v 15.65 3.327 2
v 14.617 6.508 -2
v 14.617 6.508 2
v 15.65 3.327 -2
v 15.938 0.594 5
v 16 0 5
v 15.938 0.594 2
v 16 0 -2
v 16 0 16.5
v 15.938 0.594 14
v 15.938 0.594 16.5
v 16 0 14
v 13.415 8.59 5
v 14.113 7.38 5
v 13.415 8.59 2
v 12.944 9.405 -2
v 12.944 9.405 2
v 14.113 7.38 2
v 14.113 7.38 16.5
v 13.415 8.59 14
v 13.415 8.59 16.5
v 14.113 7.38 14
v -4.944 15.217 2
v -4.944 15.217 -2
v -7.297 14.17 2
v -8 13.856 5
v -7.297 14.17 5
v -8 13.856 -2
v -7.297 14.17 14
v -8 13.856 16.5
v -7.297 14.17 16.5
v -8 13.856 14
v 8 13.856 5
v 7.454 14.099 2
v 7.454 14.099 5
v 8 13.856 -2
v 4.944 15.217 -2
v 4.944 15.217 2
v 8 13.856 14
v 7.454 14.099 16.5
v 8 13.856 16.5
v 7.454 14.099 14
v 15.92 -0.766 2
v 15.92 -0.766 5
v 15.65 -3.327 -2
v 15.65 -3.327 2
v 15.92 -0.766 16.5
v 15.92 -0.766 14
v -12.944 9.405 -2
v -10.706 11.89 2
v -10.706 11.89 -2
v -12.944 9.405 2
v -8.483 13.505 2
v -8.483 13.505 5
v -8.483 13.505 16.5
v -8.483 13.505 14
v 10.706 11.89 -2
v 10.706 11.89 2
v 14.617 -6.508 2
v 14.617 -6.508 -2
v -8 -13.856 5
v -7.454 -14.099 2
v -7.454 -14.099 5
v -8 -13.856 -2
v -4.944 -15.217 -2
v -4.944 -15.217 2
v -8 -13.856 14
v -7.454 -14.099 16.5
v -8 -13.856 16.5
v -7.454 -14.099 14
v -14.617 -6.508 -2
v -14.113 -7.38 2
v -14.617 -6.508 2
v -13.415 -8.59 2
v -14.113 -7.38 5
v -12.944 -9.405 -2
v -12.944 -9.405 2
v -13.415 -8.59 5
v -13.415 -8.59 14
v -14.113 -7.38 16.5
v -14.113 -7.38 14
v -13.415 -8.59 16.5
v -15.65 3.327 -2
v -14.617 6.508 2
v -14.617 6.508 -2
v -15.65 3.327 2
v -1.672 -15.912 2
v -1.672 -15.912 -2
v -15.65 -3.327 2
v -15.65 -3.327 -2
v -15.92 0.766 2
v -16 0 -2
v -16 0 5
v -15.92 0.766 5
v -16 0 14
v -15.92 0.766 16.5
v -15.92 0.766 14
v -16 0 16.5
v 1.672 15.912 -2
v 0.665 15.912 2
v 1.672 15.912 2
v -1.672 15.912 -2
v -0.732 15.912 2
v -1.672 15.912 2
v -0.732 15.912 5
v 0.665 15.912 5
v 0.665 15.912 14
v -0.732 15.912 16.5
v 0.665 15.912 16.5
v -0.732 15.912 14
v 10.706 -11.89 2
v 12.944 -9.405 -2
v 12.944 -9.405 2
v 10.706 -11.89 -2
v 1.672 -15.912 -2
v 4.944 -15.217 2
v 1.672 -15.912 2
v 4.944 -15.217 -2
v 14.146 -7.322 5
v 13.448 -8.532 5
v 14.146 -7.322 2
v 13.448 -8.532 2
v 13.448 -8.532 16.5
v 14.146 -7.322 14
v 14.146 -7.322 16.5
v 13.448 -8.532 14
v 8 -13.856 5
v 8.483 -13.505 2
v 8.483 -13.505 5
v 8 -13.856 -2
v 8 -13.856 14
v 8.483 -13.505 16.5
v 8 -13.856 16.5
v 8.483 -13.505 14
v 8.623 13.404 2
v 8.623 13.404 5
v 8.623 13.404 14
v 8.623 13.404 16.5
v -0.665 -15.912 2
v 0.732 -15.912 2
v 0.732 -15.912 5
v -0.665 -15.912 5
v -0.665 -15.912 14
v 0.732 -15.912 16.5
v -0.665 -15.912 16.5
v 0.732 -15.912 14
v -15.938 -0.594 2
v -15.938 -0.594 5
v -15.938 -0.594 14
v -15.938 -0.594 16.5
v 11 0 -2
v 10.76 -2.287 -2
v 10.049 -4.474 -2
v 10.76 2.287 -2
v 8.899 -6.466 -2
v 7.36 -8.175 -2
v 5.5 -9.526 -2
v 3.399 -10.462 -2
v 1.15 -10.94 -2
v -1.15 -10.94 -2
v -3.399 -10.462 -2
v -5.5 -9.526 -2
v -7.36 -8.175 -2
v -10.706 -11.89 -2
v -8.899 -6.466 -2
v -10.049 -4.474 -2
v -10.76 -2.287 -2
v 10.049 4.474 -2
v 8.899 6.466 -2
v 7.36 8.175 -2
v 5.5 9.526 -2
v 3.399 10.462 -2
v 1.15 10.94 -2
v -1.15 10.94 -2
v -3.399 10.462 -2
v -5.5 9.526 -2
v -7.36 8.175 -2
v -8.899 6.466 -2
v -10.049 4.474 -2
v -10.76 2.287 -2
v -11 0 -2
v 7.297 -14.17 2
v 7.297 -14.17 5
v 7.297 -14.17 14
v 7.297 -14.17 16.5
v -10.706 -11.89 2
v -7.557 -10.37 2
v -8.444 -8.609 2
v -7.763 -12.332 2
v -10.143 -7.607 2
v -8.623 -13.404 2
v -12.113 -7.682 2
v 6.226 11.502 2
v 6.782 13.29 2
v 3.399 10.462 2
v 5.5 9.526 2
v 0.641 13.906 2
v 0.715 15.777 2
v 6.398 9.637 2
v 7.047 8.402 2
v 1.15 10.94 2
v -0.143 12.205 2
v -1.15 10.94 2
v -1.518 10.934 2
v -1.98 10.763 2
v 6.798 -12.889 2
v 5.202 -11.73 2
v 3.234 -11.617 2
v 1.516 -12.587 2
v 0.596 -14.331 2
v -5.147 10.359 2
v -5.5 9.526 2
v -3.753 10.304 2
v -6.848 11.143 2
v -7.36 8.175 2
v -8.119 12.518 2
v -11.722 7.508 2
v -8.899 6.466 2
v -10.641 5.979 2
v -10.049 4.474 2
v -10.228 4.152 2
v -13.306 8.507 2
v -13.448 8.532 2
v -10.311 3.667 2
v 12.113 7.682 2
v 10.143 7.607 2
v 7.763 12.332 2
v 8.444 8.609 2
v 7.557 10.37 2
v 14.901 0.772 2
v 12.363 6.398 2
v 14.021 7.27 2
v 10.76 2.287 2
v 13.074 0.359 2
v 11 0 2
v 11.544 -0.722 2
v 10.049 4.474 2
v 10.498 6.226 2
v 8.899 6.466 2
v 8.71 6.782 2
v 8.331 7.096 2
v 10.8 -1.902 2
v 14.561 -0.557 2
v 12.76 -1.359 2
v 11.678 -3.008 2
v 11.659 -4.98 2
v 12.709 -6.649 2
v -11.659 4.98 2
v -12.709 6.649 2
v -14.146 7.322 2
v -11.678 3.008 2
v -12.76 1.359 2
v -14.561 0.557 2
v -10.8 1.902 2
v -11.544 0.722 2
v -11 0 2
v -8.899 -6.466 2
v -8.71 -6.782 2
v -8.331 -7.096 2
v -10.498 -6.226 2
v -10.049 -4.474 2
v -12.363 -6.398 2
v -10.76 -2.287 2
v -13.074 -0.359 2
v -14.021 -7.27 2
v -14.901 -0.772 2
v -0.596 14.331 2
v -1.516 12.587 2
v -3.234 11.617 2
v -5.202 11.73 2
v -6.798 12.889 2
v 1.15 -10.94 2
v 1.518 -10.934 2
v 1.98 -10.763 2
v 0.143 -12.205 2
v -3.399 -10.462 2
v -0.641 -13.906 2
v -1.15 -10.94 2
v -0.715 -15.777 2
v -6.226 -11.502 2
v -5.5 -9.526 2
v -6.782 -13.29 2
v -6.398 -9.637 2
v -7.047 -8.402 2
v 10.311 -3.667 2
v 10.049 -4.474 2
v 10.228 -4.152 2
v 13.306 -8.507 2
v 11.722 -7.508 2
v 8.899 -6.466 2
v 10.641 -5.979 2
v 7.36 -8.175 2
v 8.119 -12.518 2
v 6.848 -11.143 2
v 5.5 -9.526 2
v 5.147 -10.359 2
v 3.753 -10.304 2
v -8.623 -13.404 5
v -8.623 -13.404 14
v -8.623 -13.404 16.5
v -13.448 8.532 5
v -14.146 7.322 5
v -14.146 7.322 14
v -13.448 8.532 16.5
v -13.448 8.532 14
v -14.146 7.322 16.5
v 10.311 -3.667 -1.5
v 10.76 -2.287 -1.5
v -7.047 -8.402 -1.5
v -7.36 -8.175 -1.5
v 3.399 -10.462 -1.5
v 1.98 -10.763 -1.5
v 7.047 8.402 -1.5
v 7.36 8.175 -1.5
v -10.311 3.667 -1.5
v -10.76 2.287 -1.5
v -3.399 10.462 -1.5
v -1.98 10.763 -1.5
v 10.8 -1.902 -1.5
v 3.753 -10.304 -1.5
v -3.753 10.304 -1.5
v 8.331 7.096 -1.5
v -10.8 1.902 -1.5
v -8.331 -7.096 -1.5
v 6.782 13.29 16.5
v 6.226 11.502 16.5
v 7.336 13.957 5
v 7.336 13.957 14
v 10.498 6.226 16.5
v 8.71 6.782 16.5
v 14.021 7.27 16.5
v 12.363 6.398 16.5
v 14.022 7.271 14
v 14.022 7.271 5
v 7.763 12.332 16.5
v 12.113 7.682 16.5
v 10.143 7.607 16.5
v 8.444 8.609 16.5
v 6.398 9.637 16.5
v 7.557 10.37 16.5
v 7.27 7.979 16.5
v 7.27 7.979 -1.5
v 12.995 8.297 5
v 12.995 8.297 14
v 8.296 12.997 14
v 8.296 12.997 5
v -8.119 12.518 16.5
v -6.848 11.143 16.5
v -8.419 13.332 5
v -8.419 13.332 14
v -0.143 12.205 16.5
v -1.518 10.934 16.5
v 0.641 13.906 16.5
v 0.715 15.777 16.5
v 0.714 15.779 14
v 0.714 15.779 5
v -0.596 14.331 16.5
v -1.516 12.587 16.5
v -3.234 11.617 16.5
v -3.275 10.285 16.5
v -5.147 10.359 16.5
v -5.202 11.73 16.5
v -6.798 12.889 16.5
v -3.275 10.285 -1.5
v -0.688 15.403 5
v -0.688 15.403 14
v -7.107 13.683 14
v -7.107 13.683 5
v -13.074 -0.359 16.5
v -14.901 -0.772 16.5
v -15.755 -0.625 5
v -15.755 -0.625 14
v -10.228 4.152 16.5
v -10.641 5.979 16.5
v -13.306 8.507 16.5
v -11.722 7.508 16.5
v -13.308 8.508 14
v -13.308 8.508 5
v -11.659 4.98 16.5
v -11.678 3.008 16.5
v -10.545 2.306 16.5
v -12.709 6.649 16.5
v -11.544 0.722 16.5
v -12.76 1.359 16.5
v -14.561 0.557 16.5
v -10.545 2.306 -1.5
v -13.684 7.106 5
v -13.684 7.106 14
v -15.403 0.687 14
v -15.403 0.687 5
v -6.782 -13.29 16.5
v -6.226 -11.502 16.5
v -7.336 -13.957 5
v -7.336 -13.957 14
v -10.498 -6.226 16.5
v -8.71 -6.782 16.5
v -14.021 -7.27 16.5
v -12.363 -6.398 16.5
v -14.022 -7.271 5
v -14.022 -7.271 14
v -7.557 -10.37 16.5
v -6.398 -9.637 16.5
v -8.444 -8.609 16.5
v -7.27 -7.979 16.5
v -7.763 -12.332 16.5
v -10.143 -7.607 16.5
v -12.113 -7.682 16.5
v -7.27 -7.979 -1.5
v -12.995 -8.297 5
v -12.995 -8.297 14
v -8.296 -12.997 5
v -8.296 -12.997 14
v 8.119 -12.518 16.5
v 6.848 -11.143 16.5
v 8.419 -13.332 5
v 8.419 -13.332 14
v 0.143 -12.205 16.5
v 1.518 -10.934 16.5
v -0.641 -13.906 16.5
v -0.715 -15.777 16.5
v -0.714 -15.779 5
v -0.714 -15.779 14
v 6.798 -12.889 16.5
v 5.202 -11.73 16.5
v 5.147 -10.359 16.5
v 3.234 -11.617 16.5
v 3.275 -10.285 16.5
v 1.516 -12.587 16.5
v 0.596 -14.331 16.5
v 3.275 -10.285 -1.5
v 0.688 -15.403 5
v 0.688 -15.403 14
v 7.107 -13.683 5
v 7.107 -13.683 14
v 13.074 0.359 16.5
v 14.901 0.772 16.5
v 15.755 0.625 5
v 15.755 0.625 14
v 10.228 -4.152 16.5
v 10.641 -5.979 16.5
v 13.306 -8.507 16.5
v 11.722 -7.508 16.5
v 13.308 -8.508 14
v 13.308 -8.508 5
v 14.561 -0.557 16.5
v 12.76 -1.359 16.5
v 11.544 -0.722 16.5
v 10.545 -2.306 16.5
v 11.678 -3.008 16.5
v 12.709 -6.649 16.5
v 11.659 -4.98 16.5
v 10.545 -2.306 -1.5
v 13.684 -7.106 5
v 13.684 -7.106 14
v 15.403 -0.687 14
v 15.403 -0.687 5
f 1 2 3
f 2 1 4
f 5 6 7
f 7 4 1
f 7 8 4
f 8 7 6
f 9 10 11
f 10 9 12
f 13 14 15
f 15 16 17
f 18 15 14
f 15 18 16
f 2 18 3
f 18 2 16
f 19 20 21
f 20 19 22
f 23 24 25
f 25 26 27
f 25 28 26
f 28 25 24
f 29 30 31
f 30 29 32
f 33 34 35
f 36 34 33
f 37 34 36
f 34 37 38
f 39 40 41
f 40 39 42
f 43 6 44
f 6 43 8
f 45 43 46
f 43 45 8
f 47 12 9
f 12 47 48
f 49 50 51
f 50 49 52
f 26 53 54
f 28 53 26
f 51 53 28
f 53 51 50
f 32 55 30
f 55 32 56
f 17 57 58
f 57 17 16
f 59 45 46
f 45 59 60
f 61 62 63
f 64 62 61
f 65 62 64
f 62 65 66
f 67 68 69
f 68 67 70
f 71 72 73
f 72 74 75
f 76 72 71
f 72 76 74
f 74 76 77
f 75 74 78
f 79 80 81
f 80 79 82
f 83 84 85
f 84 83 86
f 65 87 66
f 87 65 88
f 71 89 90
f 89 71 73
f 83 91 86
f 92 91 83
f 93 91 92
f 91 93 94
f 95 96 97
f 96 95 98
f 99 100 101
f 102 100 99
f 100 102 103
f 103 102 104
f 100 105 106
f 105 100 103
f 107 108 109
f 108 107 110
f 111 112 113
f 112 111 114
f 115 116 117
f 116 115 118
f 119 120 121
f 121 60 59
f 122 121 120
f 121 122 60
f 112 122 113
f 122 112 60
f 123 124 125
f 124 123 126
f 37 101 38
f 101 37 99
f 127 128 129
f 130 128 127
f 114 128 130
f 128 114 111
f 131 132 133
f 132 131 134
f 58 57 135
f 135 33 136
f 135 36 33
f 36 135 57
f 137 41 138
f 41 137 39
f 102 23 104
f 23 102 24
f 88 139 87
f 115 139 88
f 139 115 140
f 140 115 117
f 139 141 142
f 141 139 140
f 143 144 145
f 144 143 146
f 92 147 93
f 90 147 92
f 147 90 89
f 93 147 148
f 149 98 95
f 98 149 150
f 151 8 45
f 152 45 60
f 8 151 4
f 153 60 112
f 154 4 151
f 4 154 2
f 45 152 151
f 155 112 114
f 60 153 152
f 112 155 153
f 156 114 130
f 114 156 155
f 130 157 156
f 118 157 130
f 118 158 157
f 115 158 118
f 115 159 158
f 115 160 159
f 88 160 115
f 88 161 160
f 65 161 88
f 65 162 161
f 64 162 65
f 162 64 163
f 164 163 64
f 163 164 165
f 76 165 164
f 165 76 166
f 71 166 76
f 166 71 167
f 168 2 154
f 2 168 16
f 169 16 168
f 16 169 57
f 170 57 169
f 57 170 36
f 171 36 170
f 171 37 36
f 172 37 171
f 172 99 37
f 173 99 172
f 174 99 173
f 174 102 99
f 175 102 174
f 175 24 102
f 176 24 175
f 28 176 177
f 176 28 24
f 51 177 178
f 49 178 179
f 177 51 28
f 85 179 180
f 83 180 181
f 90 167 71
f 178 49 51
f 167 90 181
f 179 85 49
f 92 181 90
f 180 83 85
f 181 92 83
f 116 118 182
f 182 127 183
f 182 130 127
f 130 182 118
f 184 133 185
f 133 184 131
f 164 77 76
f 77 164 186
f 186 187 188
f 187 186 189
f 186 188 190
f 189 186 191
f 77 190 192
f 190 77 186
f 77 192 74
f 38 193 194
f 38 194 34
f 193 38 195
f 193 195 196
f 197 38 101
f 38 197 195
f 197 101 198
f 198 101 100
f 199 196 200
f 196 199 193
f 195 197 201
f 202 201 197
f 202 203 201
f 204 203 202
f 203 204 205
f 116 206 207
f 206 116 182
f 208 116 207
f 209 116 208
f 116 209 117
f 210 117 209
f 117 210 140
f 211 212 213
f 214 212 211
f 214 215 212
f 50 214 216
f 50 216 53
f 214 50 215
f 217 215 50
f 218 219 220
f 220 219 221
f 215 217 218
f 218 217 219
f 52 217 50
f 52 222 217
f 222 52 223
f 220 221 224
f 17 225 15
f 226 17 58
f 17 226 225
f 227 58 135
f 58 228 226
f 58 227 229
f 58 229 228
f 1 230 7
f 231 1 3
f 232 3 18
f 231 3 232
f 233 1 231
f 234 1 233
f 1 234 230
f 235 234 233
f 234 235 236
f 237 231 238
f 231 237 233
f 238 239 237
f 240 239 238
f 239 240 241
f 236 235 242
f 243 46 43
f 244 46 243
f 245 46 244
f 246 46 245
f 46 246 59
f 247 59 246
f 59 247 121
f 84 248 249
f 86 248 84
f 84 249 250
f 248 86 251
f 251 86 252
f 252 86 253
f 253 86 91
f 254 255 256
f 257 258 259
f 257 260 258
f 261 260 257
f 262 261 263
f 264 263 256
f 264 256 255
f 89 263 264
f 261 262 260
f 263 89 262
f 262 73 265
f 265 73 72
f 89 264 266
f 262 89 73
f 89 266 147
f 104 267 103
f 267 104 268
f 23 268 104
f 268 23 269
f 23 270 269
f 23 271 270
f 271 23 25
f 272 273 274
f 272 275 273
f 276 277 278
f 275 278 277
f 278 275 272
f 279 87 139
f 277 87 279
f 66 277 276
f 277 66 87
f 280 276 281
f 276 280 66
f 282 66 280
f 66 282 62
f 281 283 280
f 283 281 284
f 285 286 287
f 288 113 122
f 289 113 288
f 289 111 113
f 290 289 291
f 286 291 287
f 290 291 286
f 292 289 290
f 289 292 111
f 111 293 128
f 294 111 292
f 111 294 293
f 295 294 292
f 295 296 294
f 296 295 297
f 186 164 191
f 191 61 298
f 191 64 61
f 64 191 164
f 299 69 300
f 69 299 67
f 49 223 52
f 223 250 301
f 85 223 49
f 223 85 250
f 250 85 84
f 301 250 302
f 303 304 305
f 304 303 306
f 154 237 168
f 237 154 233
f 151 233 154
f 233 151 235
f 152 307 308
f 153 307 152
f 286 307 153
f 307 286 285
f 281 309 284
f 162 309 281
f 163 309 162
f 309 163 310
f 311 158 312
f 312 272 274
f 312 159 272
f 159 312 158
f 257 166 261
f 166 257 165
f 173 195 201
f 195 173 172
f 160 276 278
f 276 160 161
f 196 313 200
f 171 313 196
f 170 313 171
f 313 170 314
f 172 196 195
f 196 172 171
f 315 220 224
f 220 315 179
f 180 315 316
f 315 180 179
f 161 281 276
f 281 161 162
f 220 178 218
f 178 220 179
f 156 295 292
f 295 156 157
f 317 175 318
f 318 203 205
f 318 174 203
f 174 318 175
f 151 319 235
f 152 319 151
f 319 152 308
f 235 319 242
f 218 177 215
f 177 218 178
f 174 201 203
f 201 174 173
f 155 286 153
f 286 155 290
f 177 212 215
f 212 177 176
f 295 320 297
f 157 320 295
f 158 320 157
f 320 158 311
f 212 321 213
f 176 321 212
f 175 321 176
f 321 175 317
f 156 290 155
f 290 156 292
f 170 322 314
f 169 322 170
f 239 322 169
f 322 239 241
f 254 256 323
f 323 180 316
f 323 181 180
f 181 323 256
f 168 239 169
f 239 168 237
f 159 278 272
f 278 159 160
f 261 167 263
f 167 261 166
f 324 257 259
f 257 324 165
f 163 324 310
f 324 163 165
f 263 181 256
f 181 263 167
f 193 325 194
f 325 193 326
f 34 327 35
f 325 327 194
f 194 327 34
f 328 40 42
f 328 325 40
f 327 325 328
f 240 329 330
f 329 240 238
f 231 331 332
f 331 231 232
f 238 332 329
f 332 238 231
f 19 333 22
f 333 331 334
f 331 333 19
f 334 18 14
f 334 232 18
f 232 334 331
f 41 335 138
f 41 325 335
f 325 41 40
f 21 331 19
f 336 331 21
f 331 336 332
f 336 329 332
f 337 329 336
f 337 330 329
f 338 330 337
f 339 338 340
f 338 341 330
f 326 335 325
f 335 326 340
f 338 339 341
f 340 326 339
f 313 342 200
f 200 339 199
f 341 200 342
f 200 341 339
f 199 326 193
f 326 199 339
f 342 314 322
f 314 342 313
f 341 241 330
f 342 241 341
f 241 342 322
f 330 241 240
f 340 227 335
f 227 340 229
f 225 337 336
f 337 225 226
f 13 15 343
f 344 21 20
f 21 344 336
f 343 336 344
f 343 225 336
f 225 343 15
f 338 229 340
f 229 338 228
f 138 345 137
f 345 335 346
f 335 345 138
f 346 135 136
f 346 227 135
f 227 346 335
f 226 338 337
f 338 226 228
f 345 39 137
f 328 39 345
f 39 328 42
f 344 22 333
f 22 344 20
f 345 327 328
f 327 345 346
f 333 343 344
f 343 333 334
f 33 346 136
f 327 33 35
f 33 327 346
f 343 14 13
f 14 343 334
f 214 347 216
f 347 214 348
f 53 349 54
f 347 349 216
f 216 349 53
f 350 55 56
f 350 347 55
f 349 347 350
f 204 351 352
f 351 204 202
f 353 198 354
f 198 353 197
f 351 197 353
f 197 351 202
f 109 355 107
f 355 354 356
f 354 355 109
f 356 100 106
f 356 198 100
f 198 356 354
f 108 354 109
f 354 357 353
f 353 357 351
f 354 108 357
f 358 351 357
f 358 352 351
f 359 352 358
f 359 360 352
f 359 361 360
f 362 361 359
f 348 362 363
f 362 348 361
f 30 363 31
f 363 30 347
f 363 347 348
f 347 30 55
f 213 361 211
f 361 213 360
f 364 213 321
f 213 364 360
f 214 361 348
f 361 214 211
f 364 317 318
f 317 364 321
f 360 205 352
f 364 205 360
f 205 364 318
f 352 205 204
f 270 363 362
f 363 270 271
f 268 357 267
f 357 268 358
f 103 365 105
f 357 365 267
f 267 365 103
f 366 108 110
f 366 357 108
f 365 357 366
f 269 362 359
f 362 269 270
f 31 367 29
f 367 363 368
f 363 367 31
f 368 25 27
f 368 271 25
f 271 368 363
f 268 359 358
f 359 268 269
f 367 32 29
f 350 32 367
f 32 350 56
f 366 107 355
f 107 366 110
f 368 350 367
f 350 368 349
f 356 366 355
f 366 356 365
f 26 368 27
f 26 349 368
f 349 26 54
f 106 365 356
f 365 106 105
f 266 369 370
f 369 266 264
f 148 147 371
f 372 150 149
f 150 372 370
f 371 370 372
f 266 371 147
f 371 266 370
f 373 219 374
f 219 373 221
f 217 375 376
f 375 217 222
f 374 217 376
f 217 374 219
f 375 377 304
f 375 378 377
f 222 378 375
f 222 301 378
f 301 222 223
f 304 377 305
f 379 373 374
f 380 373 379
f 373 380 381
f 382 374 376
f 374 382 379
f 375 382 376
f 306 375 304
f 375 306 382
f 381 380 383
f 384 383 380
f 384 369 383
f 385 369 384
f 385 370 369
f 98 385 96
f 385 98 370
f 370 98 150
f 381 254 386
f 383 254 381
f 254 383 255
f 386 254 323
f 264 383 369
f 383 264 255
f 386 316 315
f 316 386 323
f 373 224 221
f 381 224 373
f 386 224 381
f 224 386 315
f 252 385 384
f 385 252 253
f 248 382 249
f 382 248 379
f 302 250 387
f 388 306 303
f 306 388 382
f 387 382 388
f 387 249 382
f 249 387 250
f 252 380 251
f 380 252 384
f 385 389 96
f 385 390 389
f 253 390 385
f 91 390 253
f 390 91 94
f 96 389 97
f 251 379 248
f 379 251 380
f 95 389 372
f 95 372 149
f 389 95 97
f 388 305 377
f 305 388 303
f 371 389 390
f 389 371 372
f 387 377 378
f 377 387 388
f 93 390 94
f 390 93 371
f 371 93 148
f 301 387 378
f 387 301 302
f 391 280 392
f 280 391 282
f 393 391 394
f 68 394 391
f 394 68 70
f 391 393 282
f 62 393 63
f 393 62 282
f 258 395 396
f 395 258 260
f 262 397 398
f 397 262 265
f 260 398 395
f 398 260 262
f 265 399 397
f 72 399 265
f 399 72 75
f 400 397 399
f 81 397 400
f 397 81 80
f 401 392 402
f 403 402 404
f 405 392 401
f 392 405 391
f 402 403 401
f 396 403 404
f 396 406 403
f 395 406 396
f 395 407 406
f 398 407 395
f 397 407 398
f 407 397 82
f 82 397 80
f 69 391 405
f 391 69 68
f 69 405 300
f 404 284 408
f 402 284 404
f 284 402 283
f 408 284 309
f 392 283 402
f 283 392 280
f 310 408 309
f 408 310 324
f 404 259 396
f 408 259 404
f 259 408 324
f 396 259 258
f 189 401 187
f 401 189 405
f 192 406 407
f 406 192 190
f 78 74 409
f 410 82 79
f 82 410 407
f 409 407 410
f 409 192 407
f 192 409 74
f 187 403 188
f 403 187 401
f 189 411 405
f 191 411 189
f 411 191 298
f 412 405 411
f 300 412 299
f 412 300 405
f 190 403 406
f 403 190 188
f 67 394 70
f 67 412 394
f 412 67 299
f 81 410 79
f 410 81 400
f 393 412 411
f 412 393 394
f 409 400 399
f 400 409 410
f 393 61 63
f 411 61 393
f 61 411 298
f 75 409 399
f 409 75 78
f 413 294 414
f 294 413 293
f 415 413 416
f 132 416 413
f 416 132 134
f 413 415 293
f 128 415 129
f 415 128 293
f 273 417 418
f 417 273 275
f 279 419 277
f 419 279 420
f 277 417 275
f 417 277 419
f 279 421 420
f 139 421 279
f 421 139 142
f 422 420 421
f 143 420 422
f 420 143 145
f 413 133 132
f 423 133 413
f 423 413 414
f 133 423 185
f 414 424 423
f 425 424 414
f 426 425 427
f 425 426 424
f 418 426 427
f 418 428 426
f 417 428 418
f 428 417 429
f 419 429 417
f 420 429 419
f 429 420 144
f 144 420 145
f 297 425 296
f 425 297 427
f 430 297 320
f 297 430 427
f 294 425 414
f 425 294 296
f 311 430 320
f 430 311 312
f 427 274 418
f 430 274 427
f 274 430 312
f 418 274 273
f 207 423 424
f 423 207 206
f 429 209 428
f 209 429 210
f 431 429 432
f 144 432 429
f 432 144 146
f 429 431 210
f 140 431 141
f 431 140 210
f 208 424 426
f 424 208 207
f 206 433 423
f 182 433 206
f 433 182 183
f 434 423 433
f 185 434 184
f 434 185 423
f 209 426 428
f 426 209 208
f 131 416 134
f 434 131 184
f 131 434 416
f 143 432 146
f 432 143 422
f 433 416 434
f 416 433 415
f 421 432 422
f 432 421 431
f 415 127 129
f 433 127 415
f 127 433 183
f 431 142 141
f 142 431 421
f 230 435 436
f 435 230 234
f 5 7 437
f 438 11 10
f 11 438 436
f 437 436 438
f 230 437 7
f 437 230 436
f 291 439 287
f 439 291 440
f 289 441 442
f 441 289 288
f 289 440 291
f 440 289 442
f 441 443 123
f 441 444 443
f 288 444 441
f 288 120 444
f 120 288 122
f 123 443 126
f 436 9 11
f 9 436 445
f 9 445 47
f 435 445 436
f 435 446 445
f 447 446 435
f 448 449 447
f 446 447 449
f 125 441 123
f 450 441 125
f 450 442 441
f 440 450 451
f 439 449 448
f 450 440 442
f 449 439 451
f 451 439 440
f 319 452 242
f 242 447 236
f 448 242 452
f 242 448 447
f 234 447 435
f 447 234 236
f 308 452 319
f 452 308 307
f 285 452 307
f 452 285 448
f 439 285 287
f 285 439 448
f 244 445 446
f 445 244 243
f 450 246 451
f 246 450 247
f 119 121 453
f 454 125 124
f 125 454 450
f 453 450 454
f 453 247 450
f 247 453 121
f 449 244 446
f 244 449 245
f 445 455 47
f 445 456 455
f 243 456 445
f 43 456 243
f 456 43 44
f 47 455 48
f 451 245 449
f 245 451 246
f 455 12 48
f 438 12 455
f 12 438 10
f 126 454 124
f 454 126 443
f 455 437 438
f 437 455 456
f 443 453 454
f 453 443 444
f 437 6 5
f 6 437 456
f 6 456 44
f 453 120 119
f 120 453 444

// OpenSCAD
module pin(rot) {
  rotate([0,0,rot]) {
    translate([11, 11, -1.5]) {
      rotate([0,0,-6]) {
        difference() {
          cylinder(r=4.8, h=18, center=false, $fs=2);
          cylinder(r=3.5, h=28, center=false, $fs=2);

          translate([1,1,-2])
          *cylinder(r=4.5, h=35, center=false, $fs=4);
          rotate([0,0,51]) translate([8,0,0]) {
            *cube([15, 15, 65], center=true);
            translate([-5,0,11])
            cube([7, 15, 9], center=true);
            *translate([-5,0,11.5])
            *cube([7, 15, 2], center=true);
            *translate([-5,0,14])
            *cube([7, 15, 2], center=true);
          }
        }
      }
    }
  }
}

difference() {
  difference() {
    cylinder(r=16, h=4, center=true);
    cylinder(r=11, h=15, center=true);
  }




}

difference() {
  for (i=[0, 60, 120, 180, 240, 300]) {
    pin(i);
  }
  difference() {
    cylinder(r=26, h=55, center=true);
    cylinder(r=16, h=55, center=true);
  }
}
